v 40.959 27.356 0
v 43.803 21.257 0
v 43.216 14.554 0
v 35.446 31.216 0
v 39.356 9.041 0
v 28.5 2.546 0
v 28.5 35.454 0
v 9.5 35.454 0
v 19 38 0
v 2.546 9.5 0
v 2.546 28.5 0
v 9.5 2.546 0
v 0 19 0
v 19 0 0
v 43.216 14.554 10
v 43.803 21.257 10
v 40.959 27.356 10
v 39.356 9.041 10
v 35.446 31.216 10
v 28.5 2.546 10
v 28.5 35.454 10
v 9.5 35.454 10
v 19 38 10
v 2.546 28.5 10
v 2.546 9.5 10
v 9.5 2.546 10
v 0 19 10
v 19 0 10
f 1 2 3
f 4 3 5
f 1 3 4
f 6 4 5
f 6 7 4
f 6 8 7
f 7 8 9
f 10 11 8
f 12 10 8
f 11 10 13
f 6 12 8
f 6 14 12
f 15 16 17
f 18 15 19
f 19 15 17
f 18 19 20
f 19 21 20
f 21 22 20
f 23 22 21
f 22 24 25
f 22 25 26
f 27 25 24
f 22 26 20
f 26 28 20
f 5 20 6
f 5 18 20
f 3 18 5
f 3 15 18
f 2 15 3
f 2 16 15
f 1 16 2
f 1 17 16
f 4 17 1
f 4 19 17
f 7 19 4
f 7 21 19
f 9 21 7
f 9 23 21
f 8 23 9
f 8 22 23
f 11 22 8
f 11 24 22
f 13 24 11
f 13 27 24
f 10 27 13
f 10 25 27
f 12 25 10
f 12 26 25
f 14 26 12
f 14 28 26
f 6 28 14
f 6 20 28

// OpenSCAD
$fn = 32;

// ----------------------------------------------------------------------
// Eccentric disc: step, 10 mm thick
// ----------------------------------------------------------------------

// --- parameters (mm) ---
profile_height = 10;      // extrusion height
profile_points = 14;      // points of the closed outline

profile = [[0, 19], [2.546, 9.5], [9.5, 2.546], [19, 0], [28.5, 2.546], [39.356, 9.041], [43.216, 14.554], [43.803, 21.257], [40.959, 27.356], [35.446, 31.216], [28.5, 35.454], [19, 38], [9.5, 35.454], [2.546, 28.5]];  // single closed polygon, 14 points, counter clockwise

// --- the one profile operation ---
linear_extrude(height = profile_height) polygon(points = profile);
